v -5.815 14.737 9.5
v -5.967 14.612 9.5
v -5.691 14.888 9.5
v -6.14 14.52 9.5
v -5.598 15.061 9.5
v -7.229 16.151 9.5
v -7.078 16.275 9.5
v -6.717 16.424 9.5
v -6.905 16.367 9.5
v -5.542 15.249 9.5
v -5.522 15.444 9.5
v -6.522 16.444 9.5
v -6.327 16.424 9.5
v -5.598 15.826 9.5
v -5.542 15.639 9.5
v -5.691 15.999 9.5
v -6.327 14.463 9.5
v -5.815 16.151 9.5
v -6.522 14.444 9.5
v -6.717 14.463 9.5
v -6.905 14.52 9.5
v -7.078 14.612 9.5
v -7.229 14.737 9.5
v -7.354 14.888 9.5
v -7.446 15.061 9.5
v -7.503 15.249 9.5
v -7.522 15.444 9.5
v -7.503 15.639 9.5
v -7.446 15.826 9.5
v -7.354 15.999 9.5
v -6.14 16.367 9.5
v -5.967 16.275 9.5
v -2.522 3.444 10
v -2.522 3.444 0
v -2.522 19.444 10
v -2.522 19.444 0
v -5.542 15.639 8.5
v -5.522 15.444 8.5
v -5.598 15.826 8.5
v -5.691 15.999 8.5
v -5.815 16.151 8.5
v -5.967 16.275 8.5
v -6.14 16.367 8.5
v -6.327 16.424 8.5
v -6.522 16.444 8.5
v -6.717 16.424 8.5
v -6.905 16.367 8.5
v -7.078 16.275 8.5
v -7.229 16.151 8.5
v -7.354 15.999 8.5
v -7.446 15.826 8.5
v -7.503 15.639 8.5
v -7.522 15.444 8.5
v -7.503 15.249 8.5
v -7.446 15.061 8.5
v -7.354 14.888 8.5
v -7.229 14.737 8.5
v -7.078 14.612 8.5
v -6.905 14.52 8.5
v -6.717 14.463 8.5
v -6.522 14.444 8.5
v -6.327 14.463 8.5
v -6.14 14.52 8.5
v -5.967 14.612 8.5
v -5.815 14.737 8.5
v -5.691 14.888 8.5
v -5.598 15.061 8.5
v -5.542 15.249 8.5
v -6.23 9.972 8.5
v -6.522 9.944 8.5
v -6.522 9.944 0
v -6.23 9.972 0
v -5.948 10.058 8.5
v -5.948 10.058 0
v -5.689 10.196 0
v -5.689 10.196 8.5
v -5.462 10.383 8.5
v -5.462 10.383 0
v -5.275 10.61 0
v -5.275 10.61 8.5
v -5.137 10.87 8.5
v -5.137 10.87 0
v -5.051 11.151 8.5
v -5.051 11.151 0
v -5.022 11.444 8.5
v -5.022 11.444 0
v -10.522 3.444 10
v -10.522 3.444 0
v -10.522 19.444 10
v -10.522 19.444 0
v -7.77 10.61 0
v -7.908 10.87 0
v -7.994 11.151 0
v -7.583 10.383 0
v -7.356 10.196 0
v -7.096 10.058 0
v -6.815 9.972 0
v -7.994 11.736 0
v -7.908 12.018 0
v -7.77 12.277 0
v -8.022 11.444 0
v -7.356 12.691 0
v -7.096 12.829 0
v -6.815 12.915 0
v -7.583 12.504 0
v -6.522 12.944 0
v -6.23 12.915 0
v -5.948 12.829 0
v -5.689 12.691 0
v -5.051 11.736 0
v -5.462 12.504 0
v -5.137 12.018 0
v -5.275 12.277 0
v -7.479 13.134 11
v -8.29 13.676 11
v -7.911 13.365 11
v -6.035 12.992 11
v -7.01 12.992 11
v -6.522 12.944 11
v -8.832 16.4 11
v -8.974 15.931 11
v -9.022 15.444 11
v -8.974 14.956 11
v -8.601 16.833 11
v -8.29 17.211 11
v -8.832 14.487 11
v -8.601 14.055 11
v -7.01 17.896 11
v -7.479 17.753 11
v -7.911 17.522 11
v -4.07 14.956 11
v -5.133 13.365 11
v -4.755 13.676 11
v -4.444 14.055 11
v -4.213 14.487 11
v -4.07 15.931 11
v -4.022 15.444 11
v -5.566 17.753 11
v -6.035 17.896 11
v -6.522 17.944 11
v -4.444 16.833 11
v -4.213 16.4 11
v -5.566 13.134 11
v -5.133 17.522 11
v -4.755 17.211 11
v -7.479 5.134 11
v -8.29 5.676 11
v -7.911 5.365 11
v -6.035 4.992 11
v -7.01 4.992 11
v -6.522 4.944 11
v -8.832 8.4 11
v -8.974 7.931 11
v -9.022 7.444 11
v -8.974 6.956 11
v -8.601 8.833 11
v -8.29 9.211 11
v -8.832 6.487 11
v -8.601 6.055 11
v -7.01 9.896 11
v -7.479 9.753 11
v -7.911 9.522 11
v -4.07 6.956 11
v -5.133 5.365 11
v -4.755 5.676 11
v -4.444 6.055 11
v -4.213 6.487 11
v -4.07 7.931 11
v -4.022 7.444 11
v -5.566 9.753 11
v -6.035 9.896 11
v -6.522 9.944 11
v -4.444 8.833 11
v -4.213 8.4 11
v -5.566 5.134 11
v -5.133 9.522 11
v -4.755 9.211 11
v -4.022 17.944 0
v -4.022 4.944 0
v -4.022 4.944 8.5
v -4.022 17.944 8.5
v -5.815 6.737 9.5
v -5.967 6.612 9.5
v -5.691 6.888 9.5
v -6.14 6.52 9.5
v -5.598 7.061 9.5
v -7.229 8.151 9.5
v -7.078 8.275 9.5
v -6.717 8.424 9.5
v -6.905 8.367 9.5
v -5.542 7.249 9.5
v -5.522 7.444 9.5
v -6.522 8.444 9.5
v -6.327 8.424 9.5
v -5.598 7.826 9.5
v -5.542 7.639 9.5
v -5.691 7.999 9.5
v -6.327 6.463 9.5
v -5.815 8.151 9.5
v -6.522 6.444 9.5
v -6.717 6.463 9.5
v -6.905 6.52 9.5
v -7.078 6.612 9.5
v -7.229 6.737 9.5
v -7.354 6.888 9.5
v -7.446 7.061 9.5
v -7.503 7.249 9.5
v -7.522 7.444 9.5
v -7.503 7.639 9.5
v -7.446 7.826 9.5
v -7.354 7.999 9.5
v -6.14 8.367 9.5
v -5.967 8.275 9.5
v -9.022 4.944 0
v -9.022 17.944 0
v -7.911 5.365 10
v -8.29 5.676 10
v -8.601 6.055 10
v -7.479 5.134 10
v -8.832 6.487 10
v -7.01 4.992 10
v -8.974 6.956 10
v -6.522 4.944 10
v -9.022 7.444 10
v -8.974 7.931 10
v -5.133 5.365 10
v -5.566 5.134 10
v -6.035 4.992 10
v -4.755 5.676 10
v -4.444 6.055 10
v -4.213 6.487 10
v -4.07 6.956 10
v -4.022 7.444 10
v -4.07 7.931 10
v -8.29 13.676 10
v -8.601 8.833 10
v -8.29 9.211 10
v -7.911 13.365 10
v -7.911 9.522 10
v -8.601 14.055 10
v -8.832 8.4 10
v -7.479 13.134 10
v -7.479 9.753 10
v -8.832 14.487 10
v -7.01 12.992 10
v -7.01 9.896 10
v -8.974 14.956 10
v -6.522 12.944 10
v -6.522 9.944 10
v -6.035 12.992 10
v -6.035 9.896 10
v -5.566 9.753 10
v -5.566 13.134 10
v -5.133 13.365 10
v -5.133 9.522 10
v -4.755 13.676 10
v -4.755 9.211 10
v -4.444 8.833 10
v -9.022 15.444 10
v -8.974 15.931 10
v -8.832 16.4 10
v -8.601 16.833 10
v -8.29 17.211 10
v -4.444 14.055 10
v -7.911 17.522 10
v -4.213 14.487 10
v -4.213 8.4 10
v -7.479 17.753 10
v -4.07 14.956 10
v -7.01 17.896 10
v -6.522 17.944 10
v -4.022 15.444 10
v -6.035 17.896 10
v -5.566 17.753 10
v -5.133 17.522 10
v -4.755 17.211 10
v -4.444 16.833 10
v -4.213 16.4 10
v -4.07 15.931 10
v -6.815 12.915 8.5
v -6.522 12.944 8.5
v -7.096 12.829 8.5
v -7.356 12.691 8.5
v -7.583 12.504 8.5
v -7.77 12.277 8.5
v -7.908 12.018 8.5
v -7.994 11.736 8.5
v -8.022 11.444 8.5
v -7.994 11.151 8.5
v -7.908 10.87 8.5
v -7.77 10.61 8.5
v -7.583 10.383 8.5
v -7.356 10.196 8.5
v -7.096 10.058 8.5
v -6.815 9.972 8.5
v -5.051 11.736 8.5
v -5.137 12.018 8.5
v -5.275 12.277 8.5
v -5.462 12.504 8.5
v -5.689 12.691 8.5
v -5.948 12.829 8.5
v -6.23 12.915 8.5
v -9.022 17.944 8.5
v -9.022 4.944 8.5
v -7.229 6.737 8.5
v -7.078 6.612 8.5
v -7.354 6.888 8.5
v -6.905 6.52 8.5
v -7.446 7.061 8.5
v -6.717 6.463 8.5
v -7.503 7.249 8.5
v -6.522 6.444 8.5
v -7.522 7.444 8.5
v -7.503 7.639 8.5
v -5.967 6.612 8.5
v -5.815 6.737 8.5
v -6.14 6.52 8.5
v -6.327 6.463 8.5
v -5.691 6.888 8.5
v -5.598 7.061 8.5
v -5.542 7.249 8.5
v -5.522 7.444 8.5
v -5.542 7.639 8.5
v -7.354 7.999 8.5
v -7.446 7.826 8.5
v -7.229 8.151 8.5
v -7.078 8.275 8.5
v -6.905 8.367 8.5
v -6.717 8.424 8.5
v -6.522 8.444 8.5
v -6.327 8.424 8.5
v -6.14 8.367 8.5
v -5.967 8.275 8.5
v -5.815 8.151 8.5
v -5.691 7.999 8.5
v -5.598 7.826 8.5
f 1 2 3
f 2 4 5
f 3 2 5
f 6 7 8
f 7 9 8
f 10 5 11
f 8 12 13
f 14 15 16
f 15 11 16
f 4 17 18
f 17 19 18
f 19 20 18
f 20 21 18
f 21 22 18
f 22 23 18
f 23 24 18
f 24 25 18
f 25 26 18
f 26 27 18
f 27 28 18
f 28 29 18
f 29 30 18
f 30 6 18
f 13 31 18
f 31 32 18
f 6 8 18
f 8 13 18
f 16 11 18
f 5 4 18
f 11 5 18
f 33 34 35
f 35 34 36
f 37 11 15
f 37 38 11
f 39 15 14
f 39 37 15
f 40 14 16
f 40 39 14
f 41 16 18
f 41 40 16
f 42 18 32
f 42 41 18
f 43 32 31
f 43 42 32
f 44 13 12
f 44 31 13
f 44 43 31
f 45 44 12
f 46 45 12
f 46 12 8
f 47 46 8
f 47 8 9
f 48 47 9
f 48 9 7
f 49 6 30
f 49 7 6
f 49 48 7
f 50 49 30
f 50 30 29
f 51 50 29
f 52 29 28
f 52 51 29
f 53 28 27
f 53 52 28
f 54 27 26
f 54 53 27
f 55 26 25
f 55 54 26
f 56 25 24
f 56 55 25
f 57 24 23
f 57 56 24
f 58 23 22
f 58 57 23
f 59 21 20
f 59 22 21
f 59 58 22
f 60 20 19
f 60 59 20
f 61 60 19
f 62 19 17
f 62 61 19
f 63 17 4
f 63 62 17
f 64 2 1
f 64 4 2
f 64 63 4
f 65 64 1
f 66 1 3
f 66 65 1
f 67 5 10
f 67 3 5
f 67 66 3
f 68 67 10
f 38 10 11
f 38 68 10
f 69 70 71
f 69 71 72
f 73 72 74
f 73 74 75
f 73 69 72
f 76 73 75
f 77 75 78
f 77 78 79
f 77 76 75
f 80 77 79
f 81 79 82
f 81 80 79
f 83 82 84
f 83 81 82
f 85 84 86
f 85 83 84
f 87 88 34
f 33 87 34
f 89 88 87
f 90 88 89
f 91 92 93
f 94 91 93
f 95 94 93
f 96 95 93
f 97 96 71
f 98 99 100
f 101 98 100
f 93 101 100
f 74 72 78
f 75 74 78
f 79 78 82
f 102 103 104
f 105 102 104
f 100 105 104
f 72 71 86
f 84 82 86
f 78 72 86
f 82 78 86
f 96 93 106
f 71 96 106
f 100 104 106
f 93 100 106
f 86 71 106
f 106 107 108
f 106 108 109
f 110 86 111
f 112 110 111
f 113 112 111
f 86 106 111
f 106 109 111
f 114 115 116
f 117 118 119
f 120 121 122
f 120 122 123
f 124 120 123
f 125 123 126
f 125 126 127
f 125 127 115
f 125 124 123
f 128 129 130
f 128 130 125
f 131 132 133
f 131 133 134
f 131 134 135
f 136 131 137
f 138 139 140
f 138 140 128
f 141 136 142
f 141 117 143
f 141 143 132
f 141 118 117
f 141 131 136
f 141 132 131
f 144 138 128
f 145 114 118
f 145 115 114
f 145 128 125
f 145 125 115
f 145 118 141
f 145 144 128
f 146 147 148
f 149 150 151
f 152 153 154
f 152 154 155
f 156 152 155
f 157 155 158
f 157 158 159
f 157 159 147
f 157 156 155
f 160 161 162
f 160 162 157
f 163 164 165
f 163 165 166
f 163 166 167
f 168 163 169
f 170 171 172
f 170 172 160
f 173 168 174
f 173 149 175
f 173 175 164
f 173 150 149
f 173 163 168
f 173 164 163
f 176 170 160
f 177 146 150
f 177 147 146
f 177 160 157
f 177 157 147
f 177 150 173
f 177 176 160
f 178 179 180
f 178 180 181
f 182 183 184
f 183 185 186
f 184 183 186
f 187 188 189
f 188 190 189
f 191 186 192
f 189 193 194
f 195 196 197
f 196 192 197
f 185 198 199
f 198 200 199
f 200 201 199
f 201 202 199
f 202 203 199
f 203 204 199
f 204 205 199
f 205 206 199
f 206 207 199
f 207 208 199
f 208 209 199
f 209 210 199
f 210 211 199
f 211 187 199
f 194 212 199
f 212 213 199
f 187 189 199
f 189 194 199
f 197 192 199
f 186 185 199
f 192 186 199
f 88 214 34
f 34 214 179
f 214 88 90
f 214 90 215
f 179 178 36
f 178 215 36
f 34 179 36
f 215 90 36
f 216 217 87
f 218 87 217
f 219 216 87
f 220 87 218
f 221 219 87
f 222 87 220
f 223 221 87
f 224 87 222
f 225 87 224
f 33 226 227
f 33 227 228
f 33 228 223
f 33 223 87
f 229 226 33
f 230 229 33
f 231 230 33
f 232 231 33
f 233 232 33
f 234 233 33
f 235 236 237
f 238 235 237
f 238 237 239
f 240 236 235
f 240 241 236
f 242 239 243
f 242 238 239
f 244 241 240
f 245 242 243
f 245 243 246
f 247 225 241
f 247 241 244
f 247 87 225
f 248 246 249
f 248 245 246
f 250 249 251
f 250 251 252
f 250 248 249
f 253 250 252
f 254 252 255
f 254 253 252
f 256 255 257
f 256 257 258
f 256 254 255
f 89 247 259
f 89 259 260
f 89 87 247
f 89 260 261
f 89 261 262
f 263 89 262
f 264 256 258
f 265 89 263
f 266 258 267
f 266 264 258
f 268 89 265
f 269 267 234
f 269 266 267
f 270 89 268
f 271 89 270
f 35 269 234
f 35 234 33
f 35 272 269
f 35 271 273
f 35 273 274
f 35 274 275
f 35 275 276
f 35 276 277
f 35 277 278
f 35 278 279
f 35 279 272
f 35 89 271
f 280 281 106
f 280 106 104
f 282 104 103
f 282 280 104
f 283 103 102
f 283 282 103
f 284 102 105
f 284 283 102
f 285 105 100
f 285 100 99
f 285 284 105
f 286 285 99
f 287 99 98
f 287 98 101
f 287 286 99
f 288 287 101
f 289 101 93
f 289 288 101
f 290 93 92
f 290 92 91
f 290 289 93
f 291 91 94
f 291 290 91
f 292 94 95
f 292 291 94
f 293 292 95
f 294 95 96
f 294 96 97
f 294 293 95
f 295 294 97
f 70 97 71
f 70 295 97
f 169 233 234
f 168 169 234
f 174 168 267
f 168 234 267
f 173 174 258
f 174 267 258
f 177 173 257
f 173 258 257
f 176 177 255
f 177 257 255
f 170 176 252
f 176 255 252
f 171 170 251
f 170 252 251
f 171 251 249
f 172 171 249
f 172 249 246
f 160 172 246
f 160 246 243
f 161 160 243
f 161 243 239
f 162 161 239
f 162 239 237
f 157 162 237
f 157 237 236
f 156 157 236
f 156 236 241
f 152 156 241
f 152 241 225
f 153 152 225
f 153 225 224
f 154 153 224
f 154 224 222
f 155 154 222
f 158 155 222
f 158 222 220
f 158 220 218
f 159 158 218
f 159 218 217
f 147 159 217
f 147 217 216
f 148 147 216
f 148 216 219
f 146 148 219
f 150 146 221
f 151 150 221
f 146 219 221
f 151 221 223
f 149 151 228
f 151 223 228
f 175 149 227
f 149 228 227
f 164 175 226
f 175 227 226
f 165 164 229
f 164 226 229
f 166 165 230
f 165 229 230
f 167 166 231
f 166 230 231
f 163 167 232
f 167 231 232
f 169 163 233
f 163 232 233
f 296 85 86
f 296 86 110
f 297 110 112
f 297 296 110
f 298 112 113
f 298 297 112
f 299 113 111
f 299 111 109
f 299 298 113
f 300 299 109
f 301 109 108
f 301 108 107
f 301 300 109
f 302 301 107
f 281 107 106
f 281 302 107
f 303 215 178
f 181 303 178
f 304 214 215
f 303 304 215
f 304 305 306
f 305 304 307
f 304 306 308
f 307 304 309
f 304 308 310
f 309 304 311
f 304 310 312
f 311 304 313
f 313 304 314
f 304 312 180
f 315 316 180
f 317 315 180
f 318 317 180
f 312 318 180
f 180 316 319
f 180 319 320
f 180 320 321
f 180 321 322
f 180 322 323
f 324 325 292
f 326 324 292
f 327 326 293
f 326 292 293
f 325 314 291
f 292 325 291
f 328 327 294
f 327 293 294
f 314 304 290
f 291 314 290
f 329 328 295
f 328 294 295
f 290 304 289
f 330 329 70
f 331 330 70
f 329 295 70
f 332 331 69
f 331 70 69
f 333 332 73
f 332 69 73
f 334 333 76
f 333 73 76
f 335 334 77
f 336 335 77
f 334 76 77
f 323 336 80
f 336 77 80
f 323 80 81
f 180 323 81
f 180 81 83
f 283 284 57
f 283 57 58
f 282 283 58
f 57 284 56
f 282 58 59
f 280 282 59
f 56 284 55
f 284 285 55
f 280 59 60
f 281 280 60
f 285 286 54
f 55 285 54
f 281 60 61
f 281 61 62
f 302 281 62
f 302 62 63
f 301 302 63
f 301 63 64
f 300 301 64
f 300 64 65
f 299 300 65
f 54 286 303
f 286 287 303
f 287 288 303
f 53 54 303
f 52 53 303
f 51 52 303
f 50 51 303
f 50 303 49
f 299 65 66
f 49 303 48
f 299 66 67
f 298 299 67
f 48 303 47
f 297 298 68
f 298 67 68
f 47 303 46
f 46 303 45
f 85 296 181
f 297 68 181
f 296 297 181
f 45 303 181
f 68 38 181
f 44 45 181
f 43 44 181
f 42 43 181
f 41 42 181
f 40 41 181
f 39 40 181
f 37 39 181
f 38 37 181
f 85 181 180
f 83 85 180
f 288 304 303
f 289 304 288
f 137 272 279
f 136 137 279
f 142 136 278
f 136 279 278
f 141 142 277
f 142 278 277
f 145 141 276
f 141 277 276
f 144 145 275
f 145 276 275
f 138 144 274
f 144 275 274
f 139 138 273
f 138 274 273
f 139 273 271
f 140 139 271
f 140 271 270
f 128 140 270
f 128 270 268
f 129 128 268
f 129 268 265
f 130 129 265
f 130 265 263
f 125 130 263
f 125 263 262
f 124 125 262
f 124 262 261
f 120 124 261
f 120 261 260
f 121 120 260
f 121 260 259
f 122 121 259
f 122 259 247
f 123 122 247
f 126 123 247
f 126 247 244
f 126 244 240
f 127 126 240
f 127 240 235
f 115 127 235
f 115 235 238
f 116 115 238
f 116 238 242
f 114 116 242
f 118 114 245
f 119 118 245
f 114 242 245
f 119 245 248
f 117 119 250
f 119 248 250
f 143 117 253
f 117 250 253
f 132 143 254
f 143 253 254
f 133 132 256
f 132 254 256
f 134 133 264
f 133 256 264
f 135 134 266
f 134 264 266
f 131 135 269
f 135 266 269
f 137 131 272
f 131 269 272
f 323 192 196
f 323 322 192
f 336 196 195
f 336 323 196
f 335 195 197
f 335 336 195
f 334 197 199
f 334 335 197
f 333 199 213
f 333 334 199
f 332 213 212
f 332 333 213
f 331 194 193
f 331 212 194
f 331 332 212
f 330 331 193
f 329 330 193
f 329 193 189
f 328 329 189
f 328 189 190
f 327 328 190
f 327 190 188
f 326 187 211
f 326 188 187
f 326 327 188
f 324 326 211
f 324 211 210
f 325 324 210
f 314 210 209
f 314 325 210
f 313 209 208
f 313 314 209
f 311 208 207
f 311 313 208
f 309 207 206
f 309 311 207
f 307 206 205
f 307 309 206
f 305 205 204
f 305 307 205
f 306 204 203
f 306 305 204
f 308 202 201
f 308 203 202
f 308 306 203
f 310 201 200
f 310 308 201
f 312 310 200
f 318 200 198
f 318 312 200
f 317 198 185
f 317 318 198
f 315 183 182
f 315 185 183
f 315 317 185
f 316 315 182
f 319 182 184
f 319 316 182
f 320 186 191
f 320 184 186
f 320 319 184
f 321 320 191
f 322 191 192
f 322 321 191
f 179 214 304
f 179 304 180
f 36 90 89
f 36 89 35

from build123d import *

# Parameters (mm, degrees)
F0_W     = 8
F0_H     = 16
F1_DEPTH = 10
F2_R     = 2.5
F3_DEPTH = 1
F4_T     = -1.5
F6_DEPTH = 10


with BuildPart() as f1:
    # F0 (on Top) → F1 (new body)
    with BuildSketch(Plane.XY):
        with Locations((-6.5223464929, 11.4436195551)):
            Rectangle(F0_W, F0_H)
    extrude(amount=F1_DEPTH)

    # F2 (on face) → F3 (join)
    with BuildSketch(Plane.XY.offset(10)):
        with Locations((-6.5223464929, 7.4436195551)):
            Circle(F2_R)
        with Locations((-6.5223464929, 15.4436195551)):
            Circle(F2_R)
    extrude(amount=F3_DEPTH)

    # F4
    f4_openings = [f1.faces().sort_by_distance(p)[0] for p in [
        (-6.522346, 11.44362, 0),
    ]]
    offset(amount=F4_T, openings=f4_openings, kind=Kind.INTERSECTION)

    # F5 (on face) → F6 (join)
    with BuildSketch(Plane.XY.offset(10)):
        with BuildLine():
            ThreePointArc((-6.5223464929, 9.9436195551), (-5.4616863211, 10.3829593833), (-5.0223464929, 11.4436195551))
            ThreePointArc((-5.0223464929, 11.4436195551), (-5.4616863203, 12.5042797261), (-6.5223464908, 12.9436195551))
            ThreePointArc((-6.5223464908, 12.9436195551), (-8.0223464929, 11.4436195561), (-6.5223464929, 9.9436195551))
        make_face()
    extrude(amount=-F6_DEPTH)


solid = f1.part
